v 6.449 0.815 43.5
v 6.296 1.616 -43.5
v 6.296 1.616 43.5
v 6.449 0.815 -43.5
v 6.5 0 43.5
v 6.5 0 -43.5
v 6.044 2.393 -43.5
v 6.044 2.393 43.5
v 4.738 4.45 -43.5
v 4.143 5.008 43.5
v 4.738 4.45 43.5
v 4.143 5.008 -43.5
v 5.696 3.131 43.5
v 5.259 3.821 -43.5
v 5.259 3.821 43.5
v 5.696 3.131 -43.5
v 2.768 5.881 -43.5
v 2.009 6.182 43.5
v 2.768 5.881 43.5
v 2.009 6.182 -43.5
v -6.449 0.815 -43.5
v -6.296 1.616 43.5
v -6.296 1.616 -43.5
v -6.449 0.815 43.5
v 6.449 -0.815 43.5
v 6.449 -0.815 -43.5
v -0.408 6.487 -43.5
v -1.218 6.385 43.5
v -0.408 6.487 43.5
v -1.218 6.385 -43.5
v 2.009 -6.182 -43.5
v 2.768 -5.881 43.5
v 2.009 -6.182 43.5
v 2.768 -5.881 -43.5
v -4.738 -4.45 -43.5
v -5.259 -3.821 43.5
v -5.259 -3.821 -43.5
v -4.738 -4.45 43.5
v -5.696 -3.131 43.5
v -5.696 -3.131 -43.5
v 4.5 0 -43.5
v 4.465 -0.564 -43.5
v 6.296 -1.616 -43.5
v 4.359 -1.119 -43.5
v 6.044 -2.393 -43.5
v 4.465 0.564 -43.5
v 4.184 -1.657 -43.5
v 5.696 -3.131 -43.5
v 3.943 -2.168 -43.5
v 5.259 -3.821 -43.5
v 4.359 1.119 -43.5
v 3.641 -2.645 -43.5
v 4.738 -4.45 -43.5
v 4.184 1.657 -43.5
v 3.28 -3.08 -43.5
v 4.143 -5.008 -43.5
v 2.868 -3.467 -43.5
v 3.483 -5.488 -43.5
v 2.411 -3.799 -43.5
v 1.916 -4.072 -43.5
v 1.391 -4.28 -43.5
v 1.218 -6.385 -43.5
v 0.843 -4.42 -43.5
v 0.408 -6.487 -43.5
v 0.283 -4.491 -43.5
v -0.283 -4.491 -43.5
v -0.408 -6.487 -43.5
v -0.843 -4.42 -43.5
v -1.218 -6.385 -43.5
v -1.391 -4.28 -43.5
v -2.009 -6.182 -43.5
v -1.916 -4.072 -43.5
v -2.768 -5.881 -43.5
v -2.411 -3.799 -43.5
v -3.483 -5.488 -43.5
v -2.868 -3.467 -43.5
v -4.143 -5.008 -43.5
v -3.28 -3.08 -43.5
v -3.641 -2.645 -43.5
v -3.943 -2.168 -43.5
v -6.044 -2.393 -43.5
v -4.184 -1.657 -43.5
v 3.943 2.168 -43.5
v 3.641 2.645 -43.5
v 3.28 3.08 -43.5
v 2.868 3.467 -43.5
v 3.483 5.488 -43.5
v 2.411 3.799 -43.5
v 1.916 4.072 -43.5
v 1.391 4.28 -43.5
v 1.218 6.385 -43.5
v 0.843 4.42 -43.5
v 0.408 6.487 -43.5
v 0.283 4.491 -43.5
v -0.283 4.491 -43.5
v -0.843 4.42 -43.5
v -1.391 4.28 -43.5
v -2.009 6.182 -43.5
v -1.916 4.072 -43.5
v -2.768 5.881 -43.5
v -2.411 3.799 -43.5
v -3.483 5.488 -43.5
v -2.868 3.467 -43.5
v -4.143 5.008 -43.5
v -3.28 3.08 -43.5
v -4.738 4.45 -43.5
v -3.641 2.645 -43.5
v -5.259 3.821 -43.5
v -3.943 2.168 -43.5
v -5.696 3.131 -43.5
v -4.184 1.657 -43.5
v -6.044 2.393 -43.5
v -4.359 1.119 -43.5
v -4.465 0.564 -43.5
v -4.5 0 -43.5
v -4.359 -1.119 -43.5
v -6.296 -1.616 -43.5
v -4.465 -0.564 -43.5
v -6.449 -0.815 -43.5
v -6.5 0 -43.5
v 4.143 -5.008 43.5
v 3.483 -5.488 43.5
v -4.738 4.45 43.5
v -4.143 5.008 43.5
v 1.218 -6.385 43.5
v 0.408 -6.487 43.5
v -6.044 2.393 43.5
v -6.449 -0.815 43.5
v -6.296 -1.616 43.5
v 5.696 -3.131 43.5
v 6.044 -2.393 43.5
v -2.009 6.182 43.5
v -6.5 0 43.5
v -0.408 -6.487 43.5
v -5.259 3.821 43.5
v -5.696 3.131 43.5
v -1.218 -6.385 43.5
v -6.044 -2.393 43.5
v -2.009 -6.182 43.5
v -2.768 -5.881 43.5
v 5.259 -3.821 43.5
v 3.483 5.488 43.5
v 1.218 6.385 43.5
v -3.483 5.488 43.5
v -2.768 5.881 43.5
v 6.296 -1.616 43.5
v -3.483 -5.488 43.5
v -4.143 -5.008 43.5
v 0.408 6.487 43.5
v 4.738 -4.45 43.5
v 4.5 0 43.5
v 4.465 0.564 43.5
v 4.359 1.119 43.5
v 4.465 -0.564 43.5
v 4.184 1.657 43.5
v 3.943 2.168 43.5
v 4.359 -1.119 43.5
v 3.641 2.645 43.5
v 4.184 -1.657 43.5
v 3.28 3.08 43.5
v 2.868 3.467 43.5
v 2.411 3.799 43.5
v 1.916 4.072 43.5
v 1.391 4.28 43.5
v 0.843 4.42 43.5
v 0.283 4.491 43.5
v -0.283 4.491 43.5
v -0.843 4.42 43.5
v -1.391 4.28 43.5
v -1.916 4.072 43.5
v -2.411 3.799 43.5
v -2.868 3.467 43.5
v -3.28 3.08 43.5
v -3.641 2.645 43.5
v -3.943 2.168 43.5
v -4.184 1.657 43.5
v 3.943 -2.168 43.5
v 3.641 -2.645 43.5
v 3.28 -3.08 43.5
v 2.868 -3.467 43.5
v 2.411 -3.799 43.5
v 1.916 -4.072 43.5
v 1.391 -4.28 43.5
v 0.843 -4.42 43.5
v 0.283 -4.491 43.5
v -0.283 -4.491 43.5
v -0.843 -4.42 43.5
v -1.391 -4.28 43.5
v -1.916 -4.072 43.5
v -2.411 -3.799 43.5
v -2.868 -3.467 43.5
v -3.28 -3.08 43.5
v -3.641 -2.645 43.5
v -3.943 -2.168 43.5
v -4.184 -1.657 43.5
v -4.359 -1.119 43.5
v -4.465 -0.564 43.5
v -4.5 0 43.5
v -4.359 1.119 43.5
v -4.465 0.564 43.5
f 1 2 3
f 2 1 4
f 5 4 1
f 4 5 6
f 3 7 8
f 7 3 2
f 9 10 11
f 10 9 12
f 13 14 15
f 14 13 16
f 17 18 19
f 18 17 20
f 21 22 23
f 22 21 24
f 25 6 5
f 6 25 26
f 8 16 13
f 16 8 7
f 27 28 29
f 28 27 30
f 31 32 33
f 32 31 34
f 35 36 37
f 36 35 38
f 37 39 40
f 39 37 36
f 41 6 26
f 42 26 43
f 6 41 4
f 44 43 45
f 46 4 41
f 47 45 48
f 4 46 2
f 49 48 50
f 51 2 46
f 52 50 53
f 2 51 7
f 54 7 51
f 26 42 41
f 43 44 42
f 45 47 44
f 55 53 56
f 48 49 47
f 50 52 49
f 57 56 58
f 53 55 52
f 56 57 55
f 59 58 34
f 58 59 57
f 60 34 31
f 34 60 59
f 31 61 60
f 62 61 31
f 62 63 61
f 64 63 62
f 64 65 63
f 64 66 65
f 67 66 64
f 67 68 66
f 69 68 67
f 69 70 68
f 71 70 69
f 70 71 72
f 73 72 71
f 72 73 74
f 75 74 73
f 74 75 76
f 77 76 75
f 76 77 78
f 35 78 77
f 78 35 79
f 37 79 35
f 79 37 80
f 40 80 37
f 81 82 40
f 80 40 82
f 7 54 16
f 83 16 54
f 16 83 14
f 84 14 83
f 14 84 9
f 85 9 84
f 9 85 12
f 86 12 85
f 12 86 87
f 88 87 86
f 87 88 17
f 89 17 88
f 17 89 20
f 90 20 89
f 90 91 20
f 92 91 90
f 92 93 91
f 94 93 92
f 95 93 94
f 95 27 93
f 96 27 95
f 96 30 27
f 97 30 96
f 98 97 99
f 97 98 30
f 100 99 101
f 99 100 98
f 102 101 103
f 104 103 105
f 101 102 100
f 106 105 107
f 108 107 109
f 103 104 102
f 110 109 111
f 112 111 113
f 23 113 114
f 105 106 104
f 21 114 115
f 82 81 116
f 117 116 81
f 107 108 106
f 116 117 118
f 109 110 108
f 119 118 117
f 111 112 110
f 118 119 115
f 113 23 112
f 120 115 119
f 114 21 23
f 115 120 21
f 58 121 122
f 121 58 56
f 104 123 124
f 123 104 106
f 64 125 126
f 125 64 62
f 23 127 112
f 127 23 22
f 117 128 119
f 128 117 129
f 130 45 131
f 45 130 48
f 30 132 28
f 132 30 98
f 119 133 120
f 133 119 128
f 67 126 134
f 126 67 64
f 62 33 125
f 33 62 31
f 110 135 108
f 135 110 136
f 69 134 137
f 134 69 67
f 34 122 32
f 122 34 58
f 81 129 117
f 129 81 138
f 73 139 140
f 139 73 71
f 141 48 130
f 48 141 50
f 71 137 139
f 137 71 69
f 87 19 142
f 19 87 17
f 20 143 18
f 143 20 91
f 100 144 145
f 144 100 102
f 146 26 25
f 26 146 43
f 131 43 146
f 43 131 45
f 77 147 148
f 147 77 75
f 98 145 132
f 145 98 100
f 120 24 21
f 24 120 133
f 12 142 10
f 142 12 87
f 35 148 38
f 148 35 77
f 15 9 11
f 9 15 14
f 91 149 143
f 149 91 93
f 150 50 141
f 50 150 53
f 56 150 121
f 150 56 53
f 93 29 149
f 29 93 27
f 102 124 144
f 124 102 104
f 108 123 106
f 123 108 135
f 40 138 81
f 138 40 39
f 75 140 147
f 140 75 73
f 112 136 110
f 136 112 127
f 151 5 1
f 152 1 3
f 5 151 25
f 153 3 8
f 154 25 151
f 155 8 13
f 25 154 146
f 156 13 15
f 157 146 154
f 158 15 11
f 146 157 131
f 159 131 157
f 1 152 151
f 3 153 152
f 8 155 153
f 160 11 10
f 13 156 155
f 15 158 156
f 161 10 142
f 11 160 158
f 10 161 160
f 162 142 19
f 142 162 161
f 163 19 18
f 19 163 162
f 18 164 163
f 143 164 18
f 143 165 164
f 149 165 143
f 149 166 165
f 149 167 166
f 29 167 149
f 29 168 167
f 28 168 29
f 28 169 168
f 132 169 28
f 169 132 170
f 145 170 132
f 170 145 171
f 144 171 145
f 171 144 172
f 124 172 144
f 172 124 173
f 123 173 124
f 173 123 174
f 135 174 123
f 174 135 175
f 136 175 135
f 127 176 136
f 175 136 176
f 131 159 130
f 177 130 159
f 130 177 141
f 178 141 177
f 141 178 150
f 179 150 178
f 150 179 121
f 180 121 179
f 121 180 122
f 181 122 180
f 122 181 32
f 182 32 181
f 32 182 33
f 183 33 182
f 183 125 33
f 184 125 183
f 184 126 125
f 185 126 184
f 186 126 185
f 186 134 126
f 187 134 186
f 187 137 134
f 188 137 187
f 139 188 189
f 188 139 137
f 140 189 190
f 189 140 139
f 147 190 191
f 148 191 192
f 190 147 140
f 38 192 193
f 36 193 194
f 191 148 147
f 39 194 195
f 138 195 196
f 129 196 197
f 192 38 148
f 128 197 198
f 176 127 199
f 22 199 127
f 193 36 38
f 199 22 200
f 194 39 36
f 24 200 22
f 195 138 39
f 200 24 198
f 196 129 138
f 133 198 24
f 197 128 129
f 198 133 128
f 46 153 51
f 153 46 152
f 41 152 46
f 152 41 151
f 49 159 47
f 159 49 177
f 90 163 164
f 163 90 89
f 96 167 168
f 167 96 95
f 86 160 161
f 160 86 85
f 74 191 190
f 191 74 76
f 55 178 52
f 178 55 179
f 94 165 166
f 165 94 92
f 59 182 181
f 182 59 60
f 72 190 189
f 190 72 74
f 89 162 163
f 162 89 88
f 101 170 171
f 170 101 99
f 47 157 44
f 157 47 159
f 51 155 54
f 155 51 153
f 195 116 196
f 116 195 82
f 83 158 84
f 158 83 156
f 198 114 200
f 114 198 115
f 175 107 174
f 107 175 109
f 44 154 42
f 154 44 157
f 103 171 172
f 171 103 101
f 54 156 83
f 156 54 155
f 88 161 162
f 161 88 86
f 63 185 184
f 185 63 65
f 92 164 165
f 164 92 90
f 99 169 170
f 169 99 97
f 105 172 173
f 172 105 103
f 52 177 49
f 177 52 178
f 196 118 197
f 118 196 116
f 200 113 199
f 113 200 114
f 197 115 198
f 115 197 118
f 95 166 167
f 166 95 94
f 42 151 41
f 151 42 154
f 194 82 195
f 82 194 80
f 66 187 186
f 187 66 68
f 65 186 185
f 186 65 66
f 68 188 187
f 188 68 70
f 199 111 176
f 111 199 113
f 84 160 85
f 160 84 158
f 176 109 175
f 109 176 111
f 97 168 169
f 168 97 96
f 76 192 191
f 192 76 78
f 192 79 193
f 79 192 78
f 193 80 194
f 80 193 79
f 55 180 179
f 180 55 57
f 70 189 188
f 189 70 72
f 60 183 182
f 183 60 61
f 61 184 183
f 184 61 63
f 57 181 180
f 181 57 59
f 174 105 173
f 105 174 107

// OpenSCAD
$fn = 50;


difference() {
	union() {
		translate(v = [0, 0, -43.5000000000]) {
			cylinder(h = 87, r = 6.5000000000);
		}
	}
	union() {
		translate(v = [0, 0, -100.0000000000]) {
			cylinder(h = 200, r = 4.5000000000);
		}
	}
}
